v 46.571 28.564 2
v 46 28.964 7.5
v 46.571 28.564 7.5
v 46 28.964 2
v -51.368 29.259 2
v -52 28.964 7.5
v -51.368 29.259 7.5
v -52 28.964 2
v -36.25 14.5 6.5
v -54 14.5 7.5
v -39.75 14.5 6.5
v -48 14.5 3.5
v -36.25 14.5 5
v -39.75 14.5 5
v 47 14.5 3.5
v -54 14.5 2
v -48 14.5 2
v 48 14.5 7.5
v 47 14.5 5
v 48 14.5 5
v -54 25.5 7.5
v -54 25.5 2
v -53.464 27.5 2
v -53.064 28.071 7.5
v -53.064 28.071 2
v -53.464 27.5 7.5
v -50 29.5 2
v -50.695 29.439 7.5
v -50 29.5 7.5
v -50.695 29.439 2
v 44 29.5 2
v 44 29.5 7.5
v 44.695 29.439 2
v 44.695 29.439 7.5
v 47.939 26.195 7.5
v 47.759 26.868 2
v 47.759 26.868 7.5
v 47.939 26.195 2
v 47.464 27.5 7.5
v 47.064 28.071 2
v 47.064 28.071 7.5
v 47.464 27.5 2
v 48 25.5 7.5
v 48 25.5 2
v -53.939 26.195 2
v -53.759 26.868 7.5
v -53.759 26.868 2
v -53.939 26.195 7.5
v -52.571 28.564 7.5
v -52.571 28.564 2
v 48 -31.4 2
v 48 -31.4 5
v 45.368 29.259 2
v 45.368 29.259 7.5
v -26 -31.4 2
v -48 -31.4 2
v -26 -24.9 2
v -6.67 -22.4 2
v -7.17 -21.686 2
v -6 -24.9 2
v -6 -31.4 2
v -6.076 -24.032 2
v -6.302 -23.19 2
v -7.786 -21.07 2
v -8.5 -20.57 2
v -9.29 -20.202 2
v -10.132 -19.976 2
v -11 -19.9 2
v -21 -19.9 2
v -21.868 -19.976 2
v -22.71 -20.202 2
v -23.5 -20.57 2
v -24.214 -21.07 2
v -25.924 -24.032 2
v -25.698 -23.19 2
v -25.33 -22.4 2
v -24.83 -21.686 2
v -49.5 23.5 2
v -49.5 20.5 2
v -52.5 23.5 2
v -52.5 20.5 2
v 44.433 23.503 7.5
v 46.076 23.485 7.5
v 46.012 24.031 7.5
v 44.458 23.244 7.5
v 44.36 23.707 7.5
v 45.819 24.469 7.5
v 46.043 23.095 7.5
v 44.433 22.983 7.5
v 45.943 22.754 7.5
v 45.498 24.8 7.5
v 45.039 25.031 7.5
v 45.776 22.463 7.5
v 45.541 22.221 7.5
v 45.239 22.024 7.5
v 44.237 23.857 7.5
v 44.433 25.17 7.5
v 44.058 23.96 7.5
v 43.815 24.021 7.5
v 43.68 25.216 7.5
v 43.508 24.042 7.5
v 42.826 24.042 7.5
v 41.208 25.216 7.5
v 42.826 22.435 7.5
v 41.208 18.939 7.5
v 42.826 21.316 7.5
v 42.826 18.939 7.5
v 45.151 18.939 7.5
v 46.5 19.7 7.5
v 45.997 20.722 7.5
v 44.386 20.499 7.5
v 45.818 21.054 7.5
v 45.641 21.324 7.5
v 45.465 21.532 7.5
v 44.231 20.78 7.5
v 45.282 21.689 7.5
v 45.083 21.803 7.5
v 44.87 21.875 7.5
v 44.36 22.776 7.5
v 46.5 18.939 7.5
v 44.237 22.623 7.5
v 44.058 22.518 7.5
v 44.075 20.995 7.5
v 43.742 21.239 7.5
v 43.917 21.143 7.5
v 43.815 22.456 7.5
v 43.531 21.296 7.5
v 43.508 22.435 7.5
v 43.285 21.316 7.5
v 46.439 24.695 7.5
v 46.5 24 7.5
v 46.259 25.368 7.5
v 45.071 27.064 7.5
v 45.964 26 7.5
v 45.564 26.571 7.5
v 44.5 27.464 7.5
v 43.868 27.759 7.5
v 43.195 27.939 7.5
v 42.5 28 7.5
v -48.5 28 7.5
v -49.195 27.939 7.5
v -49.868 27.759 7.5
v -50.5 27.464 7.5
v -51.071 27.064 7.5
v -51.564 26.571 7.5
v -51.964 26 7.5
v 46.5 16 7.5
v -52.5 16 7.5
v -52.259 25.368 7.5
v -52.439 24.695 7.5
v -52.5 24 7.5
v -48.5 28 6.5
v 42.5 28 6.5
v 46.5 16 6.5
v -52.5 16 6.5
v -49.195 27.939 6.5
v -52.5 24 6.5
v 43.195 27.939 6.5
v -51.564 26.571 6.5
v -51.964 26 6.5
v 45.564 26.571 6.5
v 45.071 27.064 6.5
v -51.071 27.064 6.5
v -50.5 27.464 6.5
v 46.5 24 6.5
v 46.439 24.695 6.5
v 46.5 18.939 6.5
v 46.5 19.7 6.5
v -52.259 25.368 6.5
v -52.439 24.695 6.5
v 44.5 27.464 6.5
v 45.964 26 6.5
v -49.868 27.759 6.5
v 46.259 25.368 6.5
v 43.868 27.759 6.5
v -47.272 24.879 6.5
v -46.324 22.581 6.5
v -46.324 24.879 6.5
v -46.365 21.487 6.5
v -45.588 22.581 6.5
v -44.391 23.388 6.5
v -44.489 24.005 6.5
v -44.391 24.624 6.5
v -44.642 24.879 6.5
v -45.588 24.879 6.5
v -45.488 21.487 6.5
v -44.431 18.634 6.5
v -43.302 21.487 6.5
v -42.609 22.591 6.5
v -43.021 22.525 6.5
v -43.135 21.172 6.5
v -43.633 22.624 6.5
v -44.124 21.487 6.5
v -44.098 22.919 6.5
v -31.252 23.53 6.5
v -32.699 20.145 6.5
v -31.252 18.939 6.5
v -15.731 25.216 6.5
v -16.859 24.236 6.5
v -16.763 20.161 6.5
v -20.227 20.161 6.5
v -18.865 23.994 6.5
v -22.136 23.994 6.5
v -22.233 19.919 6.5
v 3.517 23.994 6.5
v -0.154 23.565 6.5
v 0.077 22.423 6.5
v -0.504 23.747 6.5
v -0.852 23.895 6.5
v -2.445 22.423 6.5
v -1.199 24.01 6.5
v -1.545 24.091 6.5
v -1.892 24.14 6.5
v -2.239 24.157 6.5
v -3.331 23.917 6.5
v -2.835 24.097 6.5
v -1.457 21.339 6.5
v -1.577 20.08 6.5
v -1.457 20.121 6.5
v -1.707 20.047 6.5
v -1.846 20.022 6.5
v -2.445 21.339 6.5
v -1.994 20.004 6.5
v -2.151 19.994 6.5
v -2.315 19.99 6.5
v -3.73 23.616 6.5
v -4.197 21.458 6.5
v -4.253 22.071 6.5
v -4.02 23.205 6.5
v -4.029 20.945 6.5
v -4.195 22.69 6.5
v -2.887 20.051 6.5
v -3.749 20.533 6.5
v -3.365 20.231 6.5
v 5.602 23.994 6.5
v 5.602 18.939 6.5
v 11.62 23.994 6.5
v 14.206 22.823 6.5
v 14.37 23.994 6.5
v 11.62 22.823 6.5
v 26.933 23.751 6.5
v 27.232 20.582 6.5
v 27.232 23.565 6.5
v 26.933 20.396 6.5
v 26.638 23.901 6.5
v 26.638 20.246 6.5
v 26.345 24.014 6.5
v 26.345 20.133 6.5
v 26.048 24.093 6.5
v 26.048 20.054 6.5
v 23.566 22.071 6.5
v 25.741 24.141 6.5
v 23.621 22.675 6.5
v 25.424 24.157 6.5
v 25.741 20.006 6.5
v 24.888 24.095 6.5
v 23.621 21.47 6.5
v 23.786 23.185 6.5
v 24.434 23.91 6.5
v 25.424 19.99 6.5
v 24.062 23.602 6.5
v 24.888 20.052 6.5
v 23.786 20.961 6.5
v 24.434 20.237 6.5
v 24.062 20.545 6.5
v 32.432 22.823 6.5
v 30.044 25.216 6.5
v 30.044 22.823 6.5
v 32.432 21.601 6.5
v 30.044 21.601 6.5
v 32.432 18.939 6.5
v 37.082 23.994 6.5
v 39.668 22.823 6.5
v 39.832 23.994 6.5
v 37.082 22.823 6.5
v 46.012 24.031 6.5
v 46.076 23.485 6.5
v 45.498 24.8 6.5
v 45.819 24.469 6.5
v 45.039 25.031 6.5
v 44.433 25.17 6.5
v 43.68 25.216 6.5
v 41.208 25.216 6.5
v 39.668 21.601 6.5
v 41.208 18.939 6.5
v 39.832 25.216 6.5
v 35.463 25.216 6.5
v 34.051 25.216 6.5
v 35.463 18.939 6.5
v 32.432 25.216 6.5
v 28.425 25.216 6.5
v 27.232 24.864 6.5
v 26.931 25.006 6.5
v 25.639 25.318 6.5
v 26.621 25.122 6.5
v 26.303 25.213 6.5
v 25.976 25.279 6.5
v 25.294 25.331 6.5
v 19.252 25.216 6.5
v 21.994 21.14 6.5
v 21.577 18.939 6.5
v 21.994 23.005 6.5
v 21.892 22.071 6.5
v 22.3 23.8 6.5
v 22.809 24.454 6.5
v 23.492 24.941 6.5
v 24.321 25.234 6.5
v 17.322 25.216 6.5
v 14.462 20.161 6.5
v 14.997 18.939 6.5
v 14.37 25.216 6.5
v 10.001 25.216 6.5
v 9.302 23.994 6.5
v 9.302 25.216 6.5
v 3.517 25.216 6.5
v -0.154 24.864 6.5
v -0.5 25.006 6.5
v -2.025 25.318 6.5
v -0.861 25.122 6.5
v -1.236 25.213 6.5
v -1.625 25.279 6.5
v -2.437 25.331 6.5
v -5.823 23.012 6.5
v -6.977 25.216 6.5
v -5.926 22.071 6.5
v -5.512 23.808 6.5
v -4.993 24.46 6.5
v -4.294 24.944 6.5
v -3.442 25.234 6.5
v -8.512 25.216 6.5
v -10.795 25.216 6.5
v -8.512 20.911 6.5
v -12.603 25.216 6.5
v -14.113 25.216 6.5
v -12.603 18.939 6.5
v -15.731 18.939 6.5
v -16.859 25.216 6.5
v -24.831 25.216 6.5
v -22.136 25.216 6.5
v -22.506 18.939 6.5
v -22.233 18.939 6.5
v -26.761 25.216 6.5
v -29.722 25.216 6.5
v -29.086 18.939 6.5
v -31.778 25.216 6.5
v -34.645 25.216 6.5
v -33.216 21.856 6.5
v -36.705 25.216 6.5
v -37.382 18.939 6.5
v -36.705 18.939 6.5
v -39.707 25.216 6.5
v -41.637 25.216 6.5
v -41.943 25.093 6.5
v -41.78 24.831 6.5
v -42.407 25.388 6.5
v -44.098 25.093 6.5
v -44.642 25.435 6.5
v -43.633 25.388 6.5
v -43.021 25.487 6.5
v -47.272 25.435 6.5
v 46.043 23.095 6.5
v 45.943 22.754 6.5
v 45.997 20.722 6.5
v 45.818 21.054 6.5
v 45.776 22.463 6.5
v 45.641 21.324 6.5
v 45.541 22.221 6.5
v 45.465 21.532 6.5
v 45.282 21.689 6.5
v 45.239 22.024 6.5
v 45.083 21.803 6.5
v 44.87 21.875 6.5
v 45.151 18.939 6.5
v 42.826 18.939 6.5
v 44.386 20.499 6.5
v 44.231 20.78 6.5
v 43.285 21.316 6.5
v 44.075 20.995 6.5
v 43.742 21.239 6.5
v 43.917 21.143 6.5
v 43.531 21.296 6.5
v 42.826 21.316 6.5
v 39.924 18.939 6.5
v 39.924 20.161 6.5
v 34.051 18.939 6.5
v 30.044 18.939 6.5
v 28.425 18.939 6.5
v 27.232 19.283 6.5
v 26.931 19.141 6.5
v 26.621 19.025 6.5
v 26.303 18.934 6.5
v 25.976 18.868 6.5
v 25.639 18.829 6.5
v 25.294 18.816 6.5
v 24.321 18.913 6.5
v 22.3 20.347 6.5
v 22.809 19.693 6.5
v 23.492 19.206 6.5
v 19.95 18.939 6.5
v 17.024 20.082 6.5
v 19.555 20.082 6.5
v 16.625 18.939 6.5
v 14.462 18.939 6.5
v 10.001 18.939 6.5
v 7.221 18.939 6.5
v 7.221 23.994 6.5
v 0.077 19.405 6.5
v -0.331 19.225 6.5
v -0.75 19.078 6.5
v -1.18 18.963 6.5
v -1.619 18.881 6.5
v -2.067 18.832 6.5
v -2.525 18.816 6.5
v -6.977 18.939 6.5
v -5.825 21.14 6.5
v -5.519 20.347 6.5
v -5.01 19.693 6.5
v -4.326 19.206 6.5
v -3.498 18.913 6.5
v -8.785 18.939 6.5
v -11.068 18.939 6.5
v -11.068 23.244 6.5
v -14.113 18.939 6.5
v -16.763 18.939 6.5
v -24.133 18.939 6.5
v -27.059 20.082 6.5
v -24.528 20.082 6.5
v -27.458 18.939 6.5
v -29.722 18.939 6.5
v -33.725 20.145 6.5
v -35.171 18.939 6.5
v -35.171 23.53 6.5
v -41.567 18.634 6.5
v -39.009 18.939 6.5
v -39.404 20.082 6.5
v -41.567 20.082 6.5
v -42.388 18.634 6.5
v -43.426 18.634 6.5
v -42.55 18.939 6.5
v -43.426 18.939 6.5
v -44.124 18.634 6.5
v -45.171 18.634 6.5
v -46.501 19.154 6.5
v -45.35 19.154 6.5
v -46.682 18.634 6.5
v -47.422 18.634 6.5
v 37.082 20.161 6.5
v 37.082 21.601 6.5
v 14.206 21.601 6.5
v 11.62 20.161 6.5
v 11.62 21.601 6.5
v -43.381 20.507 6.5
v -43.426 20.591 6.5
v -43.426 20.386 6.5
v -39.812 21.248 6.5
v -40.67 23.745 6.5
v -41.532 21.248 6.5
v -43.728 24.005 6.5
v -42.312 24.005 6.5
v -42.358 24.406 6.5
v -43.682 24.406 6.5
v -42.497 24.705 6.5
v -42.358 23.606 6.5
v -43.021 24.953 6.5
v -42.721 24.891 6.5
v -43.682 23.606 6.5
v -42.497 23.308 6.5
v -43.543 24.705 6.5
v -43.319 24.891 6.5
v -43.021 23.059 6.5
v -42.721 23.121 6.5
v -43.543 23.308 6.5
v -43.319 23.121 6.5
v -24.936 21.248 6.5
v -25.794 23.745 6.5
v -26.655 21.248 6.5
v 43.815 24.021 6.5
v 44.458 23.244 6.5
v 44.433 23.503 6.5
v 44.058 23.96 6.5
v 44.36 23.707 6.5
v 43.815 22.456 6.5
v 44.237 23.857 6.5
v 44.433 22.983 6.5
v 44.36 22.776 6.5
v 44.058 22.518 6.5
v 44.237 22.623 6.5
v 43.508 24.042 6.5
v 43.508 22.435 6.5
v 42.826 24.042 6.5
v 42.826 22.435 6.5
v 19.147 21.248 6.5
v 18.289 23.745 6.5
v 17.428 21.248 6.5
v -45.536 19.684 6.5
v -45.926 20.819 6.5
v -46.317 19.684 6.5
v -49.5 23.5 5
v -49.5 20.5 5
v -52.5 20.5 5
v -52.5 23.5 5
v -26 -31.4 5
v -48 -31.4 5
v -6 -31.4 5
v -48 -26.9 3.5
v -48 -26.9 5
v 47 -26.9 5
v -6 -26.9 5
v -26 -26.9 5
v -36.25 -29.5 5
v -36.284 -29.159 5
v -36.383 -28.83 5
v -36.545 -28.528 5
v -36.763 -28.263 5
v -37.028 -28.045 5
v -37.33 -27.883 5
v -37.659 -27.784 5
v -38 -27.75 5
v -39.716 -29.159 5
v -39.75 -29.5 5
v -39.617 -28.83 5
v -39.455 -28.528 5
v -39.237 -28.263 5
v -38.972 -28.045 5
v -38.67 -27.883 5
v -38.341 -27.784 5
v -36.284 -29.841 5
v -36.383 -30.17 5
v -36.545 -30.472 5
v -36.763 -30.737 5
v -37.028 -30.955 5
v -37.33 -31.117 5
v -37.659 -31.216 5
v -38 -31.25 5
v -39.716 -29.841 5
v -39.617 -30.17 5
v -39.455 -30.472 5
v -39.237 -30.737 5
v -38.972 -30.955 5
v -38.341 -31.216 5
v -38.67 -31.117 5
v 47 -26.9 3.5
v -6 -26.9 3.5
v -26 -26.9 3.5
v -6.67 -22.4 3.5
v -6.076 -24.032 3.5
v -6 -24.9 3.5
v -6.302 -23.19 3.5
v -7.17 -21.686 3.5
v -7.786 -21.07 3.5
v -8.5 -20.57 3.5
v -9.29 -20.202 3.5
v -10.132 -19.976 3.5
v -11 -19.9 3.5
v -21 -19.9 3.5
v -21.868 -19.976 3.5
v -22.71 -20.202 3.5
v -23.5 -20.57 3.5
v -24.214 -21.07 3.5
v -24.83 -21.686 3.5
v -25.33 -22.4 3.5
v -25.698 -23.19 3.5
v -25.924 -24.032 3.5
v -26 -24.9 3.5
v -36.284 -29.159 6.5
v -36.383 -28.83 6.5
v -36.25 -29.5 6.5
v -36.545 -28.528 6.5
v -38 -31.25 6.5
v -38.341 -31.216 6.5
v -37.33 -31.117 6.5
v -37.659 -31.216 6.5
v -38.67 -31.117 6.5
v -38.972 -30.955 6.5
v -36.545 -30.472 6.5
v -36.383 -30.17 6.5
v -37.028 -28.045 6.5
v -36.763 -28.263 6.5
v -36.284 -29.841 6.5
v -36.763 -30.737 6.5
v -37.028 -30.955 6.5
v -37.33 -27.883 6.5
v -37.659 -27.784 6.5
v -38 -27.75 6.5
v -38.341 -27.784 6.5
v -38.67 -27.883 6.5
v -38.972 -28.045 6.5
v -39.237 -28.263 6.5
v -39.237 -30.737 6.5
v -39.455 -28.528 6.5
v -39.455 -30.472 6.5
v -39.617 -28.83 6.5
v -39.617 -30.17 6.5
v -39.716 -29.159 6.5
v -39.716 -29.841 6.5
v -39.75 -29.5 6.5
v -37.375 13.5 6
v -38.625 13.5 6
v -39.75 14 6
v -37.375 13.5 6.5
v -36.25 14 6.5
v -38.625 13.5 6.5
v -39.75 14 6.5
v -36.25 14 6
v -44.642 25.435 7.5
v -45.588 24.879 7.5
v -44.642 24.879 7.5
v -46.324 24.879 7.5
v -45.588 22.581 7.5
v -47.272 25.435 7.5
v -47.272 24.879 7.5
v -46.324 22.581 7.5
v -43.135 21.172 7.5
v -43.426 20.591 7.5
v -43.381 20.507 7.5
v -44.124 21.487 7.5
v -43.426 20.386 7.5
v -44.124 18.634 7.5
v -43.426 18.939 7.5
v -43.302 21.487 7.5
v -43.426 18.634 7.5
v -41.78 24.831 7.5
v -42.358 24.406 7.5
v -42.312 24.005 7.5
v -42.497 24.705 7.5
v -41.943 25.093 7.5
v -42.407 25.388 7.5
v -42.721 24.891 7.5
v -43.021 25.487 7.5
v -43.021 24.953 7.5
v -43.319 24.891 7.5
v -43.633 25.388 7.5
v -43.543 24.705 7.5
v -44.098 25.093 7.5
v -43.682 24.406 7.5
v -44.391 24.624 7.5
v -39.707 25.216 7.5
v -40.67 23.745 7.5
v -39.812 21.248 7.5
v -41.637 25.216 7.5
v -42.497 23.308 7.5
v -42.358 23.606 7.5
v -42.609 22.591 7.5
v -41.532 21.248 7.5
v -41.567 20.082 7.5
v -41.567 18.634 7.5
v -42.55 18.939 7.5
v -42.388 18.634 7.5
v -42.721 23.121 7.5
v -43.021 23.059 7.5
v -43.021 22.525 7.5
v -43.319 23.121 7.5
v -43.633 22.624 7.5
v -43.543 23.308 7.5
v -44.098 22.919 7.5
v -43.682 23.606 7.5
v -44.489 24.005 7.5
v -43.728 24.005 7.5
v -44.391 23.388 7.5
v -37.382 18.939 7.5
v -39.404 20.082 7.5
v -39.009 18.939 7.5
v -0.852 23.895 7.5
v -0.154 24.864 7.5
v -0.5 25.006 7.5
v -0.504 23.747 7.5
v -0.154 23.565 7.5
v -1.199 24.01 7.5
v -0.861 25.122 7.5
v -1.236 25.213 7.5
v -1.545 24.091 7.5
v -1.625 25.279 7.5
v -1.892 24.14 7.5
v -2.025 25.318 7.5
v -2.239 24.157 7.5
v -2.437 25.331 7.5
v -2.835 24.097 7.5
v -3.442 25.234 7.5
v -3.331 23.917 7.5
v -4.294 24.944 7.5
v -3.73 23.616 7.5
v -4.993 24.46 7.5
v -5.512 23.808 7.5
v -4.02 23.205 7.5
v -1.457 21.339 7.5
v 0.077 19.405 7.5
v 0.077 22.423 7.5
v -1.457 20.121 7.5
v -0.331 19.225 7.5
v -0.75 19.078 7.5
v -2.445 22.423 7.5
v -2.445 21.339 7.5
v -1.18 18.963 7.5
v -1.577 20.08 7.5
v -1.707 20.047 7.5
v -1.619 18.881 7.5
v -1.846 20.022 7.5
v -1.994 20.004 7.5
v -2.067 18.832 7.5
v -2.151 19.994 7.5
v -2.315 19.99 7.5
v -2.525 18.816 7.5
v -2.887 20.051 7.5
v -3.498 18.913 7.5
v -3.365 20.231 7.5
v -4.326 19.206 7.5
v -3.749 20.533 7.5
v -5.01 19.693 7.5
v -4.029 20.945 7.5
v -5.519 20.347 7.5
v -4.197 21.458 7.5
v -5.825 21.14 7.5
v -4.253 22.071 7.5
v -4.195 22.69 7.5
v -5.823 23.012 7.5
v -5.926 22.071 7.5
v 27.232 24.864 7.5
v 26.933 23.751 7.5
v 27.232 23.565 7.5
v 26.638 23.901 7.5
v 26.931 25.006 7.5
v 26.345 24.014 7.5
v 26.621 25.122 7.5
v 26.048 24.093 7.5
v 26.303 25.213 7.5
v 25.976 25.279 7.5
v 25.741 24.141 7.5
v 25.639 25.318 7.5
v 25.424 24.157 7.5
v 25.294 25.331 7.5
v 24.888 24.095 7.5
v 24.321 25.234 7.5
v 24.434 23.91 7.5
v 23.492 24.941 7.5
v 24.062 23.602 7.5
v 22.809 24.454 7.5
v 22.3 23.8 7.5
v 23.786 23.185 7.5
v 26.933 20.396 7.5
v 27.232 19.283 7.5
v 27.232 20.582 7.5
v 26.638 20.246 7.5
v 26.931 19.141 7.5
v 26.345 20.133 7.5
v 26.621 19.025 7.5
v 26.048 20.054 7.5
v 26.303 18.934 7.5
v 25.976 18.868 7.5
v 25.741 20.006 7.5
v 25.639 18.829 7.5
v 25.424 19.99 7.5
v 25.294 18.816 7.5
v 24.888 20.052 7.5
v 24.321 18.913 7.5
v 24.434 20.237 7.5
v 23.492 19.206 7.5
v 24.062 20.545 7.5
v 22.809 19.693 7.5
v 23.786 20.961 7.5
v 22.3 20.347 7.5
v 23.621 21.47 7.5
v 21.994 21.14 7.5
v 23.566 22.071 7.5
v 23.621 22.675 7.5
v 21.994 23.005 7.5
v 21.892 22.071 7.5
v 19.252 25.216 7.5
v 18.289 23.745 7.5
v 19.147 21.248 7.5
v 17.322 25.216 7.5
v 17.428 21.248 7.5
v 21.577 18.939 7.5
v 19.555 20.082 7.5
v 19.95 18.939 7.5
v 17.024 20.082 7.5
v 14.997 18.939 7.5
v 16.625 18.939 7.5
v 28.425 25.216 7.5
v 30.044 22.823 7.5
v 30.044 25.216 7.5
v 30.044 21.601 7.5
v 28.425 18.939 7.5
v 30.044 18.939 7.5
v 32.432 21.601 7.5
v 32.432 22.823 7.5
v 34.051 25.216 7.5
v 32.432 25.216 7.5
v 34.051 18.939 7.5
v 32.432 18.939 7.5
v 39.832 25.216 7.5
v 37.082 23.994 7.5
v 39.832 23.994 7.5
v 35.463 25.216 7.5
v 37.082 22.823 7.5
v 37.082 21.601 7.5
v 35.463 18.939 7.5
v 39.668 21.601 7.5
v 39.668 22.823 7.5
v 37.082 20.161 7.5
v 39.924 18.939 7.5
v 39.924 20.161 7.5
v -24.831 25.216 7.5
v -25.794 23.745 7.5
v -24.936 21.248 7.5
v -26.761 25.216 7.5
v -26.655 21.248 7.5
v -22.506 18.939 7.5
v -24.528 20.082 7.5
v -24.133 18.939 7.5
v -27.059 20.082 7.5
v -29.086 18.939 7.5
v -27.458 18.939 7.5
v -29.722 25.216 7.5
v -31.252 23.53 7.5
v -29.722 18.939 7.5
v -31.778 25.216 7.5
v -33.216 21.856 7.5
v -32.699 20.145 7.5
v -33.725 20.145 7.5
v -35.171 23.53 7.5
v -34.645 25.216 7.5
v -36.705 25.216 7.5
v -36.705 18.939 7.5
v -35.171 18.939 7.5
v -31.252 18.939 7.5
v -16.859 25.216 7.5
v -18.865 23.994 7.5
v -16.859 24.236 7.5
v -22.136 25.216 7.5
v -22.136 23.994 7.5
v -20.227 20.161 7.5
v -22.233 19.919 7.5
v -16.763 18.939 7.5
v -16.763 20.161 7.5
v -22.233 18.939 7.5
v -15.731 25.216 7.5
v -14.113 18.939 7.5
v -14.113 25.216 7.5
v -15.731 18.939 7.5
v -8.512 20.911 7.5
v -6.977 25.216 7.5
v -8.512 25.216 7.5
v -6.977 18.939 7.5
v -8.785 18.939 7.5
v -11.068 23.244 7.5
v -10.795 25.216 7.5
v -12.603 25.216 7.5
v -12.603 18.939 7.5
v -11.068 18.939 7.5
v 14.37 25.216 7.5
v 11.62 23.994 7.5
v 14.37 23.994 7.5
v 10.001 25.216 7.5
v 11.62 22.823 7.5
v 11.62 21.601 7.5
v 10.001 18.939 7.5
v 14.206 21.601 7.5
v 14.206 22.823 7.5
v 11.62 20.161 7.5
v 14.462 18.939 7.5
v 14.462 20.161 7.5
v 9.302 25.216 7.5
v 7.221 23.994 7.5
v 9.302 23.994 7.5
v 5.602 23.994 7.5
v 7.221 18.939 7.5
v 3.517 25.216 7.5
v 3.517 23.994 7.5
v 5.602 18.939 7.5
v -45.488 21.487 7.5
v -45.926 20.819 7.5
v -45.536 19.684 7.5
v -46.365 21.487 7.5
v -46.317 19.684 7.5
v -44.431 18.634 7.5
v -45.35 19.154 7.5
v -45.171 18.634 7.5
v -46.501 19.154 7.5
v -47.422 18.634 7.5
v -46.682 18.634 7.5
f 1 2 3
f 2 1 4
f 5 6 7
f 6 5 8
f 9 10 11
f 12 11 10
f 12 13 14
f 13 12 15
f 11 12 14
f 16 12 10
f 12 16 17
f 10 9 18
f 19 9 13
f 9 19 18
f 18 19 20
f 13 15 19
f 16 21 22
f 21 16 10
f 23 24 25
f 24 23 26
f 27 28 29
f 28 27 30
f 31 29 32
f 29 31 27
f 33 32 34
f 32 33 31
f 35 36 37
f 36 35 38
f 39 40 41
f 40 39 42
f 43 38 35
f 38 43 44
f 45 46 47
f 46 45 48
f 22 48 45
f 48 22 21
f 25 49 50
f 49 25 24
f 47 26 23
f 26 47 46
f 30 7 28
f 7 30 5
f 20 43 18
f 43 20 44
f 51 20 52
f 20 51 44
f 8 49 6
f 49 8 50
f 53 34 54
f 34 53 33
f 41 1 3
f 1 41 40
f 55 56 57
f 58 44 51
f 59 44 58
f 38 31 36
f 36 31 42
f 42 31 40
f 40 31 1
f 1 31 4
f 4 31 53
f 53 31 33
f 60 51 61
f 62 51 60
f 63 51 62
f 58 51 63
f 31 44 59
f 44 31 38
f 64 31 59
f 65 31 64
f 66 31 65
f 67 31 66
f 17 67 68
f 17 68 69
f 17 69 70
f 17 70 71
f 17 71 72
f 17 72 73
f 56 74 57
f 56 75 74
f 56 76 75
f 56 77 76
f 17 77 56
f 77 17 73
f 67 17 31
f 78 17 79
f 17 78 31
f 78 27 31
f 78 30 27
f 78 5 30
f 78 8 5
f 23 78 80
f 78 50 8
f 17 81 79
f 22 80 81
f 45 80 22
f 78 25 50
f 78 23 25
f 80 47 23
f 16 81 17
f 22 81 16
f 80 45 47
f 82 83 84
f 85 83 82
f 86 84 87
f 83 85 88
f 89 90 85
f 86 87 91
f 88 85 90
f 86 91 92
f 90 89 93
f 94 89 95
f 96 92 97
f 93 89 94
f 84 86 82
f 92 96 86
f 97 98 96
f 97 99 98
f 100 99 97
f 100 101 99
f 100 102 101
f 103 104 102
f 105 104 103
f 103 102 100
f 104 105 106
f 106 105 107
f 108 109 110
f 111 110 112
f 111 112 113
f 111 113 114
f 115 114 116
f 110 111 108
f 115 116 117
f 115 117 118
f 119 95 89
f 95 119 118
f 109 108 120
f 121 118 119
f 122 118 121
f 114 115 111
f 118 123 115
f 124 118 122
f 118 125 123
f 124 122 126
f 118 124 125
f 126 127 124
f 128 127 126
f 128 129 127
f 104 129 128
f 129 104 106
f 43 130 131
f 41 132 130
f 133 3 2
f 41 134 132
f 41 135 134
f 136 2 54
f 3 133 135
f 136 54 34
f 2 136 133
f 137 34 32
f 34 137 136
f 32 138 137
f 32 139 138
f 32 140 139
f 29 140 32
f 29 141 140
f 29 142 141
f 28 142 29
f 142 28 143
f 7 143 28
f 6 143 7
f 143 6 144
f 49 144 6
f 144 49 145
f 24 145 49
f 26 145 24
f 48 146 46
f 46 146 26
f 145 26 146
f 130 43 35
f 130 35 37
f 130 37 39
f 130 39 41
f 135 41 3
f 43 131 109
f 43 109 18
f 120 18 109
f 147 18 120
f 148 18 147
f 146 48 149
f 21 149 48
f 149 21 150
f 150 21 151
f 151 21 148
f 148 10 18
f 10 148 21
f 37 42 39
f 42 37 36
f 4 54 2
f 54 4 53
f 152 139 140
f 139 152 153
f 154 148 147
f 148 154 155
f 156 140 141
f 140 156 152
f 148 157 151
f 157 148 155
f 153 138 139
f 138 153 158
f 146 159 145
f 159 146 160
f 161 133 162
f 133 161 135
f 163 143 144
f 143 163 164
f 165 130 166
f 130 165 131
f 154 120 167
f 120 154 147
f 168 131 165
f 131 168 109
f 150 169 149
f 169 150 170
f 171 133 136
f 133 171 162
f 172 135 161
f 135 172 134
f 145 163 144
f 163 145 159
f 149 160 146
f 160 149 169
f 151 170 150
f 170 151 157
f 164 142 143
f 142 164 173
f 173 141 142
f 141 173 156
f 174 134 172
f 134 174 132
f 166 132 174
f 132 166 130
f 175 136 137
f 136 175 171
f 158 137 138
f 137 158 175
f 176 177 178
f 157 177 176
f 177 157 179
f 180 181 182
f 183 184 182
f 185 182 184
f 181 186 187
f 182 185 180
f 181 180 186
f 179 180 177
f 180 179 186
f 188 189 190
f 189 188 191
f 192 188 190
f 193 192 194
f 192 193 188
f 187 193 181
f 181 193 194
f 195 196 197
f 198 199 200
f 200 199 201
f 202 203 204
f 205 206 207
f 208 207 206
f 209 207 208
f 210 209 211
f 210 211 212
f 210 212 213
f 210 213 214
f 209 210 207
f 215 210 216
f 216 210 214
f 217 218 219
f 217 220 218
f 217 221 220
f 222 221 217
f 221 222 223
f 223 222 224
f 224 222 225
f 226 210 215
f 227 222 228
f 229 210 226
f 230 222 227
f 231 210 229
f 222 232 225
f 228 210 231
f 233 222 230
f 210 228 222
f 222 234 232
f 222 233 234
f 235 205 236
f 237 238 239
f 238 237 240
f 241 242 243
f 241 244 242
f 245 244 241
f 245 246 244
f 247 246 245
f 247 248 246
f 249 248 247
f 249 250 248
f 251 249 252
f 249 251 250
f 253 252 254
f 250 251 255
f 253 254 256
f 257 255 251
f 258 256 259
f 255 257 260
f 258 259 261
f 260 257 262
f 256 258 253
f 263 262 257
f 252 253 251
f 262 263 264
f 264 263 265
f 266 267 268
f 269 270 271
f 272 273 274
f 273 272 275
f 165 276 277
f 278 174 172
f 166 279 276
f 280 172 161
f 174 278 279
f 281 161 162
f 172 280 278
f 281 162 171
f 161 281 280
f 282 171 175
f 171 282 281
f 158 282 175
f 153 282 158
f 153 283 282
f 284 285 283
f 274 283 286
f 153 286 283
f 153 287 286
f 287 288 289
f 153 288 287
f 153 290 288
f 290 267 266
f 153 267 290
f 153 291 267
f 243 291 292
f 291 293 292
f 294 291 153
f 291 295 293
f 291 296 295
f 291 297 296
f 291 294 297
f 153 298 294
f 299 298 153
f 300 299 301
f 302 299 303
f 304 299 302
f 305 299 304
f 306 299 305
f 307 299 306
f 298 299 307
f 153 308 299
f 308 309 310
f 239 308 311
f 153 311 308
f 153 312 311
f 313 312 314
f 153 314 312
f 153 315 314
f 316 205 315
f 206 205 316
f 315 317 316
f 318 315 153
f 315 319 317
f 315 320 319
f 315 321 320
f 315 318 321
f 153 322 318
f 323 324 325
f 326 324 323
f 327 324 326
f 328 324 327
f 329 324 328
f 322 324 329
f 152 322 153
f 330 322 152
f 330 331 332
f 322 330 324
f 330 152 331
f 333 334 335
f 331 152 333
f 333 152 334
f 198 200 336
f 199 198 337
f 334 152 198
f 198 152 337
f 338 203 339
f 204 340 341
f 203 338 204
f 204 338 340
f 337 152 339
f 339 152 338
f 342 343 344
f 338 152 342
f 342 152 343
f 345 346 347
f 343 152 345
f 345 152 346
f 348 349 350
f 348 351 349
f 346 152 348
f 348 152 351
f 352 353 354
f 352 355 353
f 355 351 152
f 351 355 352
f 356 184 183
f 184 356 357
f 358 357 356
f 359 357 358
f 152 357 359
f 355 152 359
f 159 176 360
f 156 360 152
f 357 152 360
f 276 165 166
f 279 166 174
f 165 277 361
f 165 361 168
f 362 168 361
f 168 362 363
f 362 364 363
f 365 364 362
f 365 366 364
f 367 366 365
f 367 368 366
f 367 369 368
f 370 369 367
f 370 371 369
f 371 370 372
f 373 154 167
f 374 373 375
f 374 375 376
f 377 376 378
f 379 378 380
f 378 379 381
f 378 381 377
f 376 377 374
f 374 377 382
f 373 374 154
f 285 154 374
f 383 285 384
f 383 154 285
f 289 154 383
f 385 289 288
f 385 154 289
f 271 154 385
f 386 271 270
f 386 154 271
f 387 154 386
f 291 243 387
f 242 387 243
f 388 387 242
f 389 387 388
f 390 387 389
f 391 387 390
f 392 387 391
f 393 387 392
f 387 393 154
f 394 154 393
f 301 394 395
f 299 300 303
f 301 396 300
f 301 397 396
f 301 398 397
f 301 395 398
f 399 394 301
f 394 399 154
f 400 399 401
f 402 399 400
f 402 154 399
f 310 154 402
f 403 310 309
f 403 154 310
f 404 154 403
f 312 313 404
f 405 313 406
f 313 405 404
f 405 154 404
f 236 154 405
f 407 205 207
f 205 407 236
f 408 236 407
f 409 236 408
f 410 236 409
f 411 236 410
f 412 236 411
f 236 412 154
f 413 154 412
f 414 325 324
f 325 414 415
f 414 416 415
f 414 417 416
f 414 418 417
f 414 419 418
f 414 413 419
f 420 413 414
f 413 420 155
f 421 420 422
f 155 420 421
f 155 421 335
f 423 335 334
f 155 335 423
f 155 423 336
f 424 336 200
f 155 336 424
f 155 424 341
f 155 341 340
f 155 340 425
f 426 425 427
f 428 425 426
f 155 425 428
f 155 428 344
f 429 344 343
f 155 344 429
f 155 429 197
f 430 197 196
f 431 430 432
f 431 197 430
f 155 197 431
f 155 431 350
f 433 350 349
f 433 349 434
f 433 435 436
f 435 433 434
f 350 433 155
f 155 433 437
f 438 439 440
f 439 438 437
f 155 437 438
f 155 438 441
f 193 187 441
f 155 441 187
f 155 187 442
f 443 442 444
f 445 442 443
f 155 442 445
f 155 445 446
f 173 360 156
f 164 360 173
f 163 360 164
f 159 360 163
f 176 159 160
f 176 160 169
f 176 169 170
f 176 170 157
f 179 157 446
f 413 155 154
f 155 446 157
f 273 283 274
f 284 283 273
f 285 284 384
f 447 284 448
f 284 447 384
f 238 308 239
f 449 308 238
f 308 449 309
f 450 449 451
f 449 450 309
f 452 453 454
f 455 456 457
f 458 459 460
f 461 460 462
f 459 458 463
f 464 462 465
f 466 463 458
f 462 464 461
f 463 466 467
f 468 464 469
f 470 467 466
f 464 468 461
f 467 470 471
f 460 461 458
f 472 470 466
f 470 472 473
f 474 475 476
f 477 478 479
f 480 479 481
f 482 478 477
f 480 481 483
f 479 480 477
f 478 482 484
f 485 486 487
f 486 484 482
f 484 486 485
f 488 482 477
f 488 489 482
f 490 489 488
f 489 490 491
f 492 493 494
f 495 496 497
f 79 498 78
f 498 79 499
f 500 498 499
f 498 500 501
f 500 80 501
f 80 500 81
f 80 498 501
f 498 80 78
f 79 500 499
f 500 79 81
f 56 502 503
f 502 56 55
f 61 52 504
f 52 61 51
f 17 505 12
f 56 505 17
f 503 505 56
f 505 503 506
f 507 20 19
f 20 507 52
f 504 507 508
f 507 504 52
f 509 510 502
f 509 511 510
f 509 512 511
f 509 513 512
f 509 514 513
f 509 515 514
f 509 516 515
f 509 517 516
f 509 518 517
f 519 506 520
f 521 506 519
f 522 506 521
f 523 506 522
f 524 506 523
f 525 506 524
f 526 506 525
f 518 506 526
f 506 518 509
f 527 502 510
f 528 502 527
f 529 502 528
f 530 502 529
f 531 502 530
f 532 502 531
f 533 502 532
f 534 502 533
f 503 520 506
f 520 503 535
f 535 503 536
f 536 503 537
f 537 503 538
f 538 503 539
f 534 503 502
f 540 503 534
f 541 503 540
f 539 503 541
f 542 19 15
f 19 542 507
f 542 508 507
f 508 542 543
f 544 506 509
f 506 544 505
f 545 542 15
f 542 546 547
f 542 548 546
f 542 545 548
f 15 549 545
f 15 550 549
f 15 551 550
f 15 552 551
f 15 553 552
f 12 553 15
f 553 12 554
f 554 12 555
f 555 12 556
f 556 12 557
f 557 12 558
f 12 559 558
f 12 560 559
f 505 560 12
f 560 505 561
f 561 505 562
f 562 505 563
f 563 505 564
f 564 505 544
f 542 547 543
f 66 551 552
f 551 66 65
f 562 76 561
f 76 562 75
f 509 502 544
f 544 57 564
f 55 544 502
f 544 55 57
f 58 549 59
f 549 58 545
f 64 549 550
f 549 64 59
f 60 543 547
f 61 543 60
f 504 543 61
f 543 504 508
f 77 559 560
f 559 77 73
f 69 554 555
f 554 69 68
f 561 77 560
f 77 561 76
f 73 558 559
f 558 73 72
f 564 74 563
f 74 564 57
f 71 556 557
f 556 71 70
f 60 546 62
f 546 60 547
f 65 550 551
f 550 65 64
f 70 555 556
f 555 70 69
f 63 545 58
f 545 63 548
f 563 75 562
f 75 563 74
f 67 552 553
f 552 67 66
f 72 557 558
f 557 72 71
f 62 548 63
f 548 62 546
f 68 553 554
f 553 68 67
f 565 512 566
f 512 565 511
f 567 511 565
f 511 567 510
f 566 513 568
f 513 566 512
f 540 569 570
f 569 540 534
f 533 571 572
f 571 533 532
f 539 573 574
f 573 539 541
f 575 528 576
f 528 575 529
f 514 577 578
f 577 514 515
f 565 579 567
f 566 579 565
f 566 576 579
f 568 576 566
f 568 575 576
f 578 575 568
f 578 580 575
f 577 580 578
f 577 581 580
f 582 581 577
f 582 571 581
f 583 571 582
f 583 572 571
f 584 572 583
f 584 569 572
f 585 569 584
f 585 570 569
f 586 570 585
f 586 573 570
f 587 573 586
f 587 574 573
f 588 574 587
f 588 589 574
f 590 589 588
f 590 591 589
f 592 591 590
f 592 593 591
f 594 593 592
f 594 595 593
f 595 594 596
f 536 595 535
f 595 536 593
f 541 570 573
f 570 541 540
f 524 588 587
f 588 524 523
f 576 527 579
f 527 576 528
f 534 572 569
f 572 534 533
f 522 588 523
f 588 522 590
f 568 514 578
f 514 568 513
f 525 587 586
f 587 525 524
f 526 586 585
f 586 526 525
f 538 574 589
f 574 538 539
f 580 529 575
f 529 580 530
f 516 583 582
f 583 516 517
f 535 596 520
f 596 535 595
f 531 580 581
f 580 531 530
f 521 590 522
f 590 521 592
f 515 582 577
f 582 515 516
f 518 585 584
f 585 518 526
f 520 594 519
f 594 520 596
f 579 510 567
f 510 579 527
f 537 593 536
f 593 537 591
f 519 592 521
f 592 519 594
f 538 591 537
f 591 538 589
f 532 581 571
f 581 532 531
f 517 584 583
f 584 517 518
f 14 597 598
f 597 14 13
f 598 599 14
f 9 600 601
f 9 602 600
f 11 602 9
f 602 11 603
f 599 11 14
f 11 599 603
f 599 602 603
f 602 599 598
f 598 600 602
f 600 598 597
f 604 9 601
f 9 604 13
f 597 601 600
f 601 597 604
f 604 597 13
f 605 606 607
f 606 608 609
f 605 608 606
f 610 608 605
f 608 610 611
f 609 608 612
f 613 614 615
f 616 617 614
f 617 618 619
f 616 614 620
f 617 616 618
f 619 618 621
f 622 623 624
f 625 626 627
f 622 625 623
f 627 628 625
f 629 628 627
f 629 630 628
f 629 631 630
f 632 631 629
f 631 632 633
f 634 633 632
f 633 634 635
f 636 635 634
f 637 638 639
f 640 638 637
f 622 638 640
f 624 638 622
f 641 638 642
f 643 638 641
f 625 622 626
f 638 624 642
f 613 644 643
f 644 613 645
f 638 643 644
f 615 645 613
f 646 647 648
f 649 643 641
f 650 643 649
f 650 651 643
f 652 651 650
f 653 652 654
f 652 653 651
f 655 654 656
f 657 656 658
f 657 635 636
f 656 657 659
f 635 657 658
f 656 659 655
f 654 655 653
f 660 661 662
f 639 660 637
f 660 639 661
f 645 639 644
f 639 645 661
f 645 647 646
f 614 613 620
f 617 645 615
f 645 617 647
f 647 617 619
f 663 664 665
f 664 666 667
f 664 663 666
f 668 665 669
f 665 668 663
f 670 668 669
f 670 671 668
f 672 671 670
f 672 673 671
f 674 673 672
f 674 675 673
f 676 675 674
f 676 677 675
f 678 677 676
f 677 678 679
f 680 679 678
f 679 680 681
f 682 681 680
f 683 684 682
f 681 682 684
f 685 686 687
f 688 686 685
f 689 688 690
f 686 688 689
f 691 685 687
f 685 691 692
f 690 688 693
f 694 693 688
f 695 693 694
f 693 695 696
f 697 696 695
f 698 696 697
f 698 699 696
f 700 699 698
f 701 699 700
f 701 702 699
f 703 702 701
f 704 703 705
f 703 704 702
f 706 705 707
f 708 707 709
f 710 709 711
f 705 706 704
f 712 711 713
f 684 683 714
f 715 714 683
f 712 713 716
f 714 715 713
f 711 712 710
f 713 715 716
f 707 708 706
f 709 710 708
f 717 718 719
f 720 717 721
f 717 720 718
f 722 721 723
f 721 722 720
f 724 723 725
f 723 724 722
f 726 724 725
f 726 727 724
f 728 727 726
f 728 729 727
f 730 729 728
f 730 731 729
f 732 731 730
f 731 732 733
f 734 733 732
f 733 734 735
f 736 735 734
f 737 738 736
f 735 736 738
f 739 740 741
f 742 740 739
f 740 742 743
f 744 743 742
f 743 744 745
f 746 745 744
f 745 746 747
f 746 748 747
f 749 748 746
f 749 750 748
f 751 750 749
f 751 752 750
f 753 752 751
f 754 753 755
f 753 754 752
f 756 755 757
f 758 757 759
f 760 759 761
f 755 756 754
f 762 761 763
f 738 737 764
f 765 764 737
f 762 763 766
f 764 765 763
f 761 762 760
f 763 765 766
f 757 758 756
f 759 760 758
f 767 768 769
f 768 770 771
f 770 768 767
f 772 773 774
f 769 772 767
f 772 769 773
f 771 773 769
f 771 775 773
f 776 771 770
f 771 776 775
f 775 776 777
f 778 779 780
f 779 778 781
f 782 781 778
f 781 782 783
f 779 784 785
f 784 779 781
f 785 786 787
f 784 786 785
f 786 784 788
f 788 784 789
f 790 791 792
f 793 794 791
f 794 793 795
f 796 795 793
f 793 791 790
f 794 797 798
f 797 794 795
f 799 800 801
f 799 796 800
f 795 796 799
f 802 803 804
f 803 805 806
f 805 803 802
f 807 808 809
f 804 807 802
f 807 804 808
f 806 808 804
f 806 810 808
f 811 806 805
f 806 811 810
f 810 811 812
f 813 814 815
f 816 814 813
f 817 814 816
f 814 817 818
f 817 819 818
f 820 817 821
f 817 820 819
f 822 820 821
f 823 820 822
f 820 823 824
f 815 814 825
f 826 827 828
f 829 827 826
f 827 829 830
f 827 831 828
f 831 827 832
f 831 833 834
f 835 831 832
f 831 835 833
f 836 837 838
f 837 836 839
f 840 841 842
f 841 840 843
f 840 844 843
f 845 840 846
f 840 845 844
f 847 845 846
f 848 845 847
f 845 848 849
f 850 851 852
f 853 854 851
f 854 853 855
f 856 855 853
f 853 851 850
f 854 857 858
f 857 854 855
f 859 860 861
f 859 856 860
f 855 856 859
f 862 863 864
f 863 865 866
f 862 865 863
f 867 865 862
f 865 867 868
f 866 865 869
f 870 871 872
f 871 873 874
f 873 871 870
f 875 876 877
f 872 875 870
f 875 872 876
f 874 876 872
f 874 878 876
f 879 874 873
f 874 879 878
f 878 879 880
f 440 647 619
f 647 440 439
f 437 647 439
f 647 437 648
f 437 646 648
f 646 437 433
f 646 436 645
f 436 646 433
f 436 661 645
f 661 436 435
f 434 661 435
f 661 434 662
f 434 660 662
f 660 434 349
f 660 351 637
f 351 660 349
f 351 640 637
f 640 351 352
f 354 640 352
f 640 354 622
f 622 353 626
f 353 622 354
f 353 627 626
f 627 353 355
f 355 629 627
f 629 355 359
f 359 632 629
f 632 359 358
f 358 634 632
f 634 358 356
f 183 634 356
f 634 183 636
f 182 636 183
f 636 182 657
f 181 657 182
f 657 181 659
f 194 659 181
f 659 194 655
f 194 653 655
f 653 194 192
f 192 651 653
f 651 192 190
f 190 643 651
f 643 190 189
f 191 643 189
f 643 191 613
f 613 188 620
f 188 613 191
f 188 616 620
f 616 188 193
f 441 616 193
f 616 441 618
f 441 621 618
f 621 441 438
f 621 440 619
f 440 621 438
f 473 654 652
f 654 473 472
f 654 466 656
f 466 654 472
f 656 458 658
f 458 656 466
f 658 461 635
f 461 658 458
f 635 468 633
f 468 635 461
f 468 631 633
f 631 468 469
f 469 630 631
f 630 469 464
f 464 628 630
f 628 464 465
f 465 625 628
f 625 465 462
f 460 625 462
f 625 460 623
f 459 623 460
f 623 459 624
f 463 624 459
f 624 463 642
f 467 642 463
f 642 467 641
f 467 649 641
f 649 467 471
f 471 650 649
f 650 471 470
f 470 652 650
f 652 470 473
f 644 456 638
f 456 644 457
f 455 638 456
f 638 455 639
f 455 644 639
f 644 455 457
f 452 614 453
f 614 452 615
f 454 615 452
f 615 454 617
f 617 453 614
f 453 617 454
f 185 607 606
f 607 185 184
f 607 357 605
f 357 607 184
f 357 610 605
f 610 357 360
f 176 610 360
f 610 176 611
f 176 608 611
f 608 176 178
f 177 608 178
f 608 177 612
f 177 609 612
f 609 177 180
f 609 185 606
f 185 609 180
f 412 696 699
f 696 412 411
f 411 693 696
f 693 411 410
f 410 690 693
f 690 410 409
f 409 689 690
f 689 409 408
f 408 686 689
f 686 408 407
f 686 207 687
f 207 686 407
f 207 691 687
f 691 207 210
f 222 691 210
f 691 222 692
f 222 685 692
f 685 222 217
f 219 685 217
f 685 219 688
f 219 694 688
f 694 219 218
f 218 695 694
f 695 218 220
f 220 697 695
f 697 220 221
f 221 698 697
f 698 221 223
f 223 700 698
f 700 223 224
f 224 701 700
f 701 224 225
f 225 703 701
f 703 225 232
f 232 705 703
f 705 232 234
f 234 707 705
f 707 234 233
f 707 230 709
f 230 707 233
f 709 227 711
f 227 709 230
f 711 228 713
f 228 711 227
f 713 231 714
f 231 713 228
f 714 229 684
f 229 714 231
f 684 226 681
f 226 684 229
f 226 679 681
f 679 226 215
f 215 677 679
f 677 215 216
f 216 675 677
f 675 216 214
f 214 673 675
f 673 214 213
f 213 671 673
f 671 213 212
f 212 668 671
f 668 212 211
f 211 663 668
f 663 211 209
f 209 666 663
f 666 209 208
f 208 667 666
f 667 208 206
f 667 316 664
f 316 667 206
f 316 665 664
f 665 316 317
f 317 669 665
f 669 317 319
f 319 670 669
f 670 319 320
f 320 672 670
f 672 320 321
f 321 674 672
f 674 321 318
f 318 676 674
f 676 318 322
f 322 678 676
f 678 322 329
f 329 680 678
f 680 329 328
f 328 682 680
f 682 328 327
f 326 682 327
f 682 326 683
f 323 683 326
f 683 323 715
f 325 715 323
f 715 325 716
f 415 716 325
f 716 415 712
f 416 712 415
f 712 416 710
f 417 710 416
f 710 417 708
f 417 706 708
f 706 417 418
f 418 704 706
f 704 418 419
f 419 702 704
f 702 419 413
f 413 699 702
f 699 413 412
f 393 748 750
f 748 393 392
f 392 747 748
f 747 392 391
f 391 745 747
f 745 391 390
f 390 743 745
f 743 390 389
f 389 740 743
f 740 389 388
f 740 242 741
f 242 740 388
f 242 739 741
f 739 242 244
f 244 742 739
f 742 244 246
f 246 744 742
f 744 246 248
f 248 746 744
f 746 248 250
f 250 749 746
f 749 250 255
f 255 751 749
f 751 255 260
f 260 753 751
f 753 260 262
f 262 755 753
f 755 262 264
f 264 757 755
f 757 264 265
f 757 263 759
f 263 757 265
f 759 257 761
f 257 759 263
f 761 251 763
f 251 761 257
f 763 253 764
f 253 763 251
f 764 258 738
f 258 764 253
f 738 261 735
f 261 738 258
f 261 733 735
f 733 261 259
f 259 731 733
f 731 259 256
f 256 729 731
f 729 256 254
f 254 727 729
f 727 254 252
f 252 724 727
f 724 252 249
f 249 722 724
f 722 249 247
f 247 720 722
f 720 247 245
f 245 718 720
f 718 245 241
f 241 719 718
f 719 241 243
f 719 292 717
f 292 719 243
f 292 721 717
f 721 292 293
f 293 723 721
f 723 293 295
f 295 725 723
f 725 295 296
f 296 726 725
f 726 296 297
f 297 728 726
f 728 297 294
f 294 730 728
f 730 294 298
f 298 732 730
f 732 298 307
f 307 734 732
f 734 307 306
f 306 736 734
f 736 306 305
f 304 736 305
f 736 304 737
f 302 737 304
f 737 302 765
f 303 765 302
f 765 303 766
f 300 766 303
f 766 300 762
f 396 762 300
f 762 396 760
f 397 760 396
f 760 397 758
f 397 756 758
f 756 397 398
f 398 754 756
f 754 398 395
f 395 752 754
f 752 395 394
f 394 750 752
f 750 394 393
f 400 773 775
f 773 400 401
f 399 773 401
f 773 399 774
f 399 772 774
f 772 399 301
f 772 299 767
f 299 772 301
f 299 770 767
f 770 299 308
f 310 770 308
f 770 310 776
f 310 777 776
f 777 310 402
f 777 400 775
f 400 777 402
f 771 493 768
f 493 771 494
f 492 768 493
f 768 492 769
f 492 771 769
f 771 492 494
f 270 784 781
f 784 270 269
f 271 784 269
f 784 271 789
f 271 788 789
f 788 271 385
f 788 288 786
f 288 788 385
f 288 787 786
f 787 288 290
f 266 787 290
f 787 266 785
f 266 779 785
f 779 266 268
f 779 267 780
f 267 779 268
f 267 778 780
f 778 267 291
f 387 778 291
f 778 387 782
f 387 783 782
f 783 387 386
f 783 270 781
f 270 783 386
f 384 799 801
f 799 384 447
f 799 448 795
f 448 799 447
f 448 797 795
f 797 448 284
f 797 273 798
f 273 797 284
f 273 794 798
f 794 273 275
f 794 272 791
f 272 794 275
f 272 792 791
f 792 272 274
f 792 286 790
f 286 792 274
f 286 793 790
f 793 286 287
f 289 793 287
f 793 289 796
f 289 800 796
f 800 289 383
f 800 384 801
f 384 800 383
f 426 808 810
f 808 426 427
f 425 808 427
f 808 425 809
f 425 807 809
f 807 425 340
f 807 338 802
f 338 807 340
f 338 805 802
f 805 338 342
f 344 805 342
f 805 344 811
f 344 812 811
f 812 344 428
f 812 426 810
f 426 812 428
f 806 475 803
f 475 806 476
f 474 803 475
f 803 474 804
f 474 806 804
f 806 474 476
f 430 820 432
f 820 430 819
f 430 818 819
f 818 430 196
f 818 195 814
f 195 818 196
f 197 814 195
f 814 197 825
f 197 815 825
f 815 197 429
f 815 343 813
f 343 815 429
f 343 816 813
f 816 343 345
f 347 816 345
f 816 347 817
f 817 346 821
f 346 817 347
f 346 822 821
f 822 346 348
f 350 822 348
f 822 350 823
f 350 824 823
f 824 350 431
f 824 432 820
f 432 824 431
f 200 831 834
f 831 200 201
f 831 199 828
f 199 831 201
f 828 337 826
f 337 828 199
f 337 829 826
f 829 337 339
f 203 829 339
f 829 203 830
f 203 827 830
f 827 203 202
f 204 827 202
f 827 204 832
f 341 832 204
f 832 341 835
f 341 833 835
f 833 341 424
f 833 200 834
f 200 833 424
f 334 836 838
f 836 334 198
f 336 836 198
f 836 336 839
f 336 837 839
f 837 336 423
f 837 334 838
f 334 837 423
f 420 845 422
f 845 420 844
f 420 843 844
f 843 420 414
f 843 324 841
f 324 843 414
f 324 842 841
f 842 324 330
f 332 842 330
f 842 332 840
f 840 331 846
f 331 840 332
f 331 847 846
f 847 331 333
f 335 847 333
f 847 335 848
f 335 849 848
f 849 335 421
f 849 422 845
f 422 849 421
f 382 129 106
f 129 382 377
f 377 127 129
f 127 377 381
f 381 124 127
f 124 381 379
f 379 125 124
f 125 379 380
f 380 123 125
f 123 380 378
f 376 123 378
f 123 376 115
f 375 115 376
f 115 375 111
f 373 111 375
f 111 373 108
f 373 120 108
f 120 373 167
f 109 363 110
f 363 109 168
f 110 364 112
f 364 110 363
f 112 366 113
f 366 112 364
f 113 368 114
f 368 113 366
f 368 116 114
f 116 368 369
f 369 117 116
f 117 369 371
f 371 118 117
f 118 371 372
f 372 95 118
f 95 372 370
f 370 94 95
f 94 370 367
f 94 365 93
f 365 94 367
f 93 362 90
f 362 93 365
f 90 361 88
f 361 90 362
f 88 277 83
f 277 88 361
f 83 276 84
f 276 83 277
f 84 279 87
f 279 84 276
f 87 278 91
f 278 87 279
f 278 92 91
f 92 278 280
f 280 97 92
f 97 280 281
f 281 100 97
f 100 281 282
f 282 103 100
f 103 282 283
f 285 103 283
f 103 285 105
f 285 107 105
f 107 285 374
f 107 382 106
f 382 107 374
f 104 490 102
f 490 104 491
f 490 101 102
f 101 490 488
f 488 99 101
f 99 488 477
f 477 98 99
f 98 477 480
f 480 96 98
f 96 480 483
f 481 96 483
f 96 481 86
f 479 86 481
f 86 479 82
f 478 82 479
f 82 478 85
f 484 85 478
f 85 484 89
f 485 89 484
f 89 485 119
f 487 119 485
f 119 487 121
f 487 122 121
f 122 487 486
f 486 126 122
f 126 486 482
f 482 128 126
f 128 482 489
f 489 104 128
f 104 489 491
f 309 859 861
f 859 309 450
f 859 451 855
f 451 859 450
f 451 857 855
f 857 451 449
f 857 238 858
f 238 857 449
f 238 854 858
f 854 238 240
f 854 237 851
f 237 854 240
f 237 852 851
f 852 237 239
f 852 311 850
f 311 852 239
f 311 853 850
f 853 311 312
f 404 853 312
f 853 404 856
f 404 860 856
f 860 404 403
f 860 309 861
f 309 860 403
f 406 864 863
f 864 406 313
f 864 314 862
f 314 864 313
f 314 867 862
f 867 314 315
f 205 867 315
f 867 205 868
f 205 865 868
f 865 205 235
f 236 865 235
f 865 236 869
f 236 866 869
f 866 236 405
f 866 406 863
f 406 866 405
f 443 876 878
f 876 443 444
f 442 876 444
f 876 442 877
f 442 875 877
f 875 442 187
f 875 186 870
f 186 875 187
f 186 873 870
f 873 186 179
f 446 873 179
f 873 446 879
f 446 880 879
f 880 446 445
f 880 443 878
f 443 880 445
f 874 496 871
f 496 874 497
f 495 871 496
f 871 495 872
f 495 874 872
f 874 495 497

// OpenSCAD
textLeft1="TO";
textLeft2="AN";
textMain="AMAZING TEACHER";

/* [hidden] */



font_width_arial_black = [
["A",0.778],["B",0.778],["C",0.778],["D",0.778],["E",0.722],
["F",0.667],["G",0.833],["H",0.833],["I",0.389],["J",0.667],
["K",0.833],["L",0.667],["M",0.944],["N",0.833],["O",0.833],
["P",0.722],["Q",0.833],["R",0.778],["S",0.722],["T",0.722],
["U",0.833],["V",0.778],["W",1],["X",0.778],["Y",0.778],
["Z",0.722],["a",0.667],["b",0.667],["c",0.667],["d",0.667],
["e",0.667],["f",0.389],["g",0.667],["h",0.667],["i",0.333],
["j",0.333],["k",0.667],["l",0.333],["m",1],["n",0.667],
["o",0.667],["p",0.667],["q",0.667],["r",0.444],["s",0.611],
["t",0.444],["u",0.667],["v",0.611],["w",0.944],["x",0.667],
["y",0.611],["z",0.556],["1",0.667],["2",0.667],["3",0.667],
["4",0.667],["5",0.667],["6",0.667],["7",0.667],["8",0.667],
["9",0.667],["0",0.667],["!",0.333],["@",0.74],["#",0.66],
["$",0.667],["%",1],["^",0.66],["&",0.889],["*",0.556],
["(",0.389],[")",0.389],["_",0.5],[":",0.333],[",",0.333],
[".",0.333],["\"",0.5],["'",0.278],["-",0.333],[" ",0.334],["?",0.611],
["~",0]
];
font_width_scale_arial_black = 1;
//font_width_scale_arial_black = 94.8/70.9466;

font_width_arial = [
["A",0.667],["B",0.667],["C",0.722],["D",0.722],["E",0.667],
["F",0.611],["G",0.778],["H",0.722],["I",0.278],["J",0.5],
["K",0.667],["L",0.556],["M",0.833],["N",0.722],["O",0.778],
["P",0.667],["Q",0.778],["R",0.722],["S",0.667],["T",0.611],
["U",0.722],["V",0.667],["W",0.944],["X",0.667],["Y",0.667],
["Z",0.611],["a",0.556],["b",0.556],["c",0.5],["d",0.556],
["e",0.556],["f",0.278],["g",0.556],["h",0.556],["i",0.222],
["j",0.222],["k",0.5],["l",0.222],["m",0.833],["n",0.556],
["o",0.556],["p",0.556],["q",0.556],["r",0.333],["s",0.5],
["t",0.278],["u",0.556],["v",0.5],["w",0.722],["x",0.5],
["y",0.5],["z",0.5],["1",0.556],["2",0.556],["3",0.556],
["4",0.556],["5",0.556],["6",0.556],["7",0.556],["8",0.556],
["9",0.556],["0",0.556],["!",0.278],["@",1.015],["#",0.556],
["$",0.556],["%",0.889],["^",0.469],["&",0.667],["*",0.389],
["(",0.333],[")",0.333],["_",0.556],[":",0.278],[",",0.278],
[".",0.278],["?",0.556],["-",0.333],[" ",0.278],["~",0]
];
font_width_scale_arial = 83.5/63.3826;

font_width_arial_bold = [
["A",0.722],["B",0.667],["C",0.667],["D",0.722],["E",0.611],
["F",0.556],["G",0.722],["H",0.722],["I",0.333],["J",0.389],
["K",0.722],["L",0.611],["M",0.889],["N",0.722],["O",0.722],
["P",0.556],["Q",0.722],["R",0.667],["S",0.556],["T",0.611],
["U",0.722],["V",0.722],["W",0.944],["X",0.722],["Y",0.722],
["Z",0.611],["a",0.444],["b",0.5],["c",0.444],["d",0.5],
["e",0.444],["f",0.333],["g",0.5],["h",0.5],["i",0.278],
["j",0.278],["k",0.5],["l",0.278],["m",0.778],["n",0.5],
["o",0.5],["p",0.5],["q",0.5],["r",0.333],["s",0.389],
["t",0.278],["u",0.5],["v",0.5],["w",0.722],["x",0.5],
["y",0.5],["z",0.444],["1",0.5],["2",0.5],["3",0.5],
["4",0.5],["5",0.5],["6",0.5],["7",0.5],["8",0.5],
["9",0.5],["0",0.5],["!",0.333],["@",0.921],["#",0.5],
["$",0.5],["%",0.833],["^",0.469],["&",0.778],["*",0.5],
["(",0.333],[")",0.333],["_",0.5],[":",0.278],[",",0.25],
[".",0.25],["?",0.444],["-",0.333],[" ",0.25],["~",0],
];
font_width_scale_arial_bold = 85.0/63.023;


font="Arial Sans:style=Bold";
t = font_width_arial_bold;
s = font_width_scale_arial_bold;

// add text:
/*
font="Arial Black";
t = font_width_arial_black;
s = font_width_scale_arial_black;
*/
/*
font="Arial";
t = font_width_arial;
s = font_width_scale_arial;
*/
/*
font="Arial Sans:style=Bold";
t = font_width_arial_bold;
s = font_width_scale_arial_bold;
*/


function getCharWidth(ch="X") =
    t[search(ch, t, num_returns_per_match=0)[0][0]][1];

function _getStringWidth(str,i=0) =
    len(str) > i ? getCharWidth(str[i]) + _getStringWidth(str,i+1) : 0;

function getStringWidth(str,size) = 
    (_getStringWidth(str,0)+(len(str)-1)*getCharWidth("~")) * s * size;

/*
module getCharWidthMod(ch="X") = 
    
    echo("char - ", ch);
    idx = search(ch, t, num_returns_per_match=0);
    if (len(idx[0])) {
        echo(ch, idx, idx[0][0], t[idx[0][0]][1]);
        
    } else {
        echo ("not found");
    };
}
*/

mainFontSize=6.2;
smallFontSize=mainFontSize/2.2;

    
textLeftSize = max( getStringWidth(textLeft1,smallFontSize), 
                    getStringWidth(textLeft2,smallFontSize));
textMainSize = getStringWidth(textMain,mainFontSize);

gapSize = textLeftSize > 0 ? textMainSize > 0 ? 3 : 0 : 0;

textMainOffset=(textLeftSize+gapSize)/2;
textLeftOffset=textMainOffset-textMainSize/2-gapSize-textLeftSize/2;

echo(textMainOffset);
echo(textLeftOffset);

textHotPoint=[-2.8,22,6.5];

/*
translate(textHotPoint)  translate([textMainOffset,0,0]){
    
    color("blue") sphere(2);
    color("blue") translate([textMainSize/2,0,0]) sphere(1);
    color("blue") translate([-textMainSize/2,0,0]) sphere(1);
    color("blue") translate([-textMainSize/2-gapSize,0,0]) sphere(1);
    color("blue") translate([-textMainSize/2-gapSize-textLeftSize,0,0]) sphere(1);
}
*/

translate(textHotPoint)
color("red")
linear_extrude(1) {
    
    translate([textMainOffset,0,0])
    text(textMain, size= mainFontSize, font=font, halign="center", valign="center");


    // draw small text:
    translate([textLeftOffset,smallFontSize*0.7,0]) 
        text(textLeft1, size = smallFontSize, font=font, halign="center", valign="center");
    translate([textLeftOffset,-smallFontSize*0.7,0]) 
        text(textLeft2, size = smallFontSize, font=font, halign="center", valign="center");
    
}
//object_stl(1);
// Here is right object !!!

translate([0,0,2]){
  translate([-3,22,0])
    difference(){
      rounded_brick([102,15,5.5],[4,0,4,0]);
      translate([0,0,4.5])rounded_brick([102-3,15-3,5.5],[4,0,4,0]);
      translate([-49.5,-1.5,-.1])cube([3,3,3.1]);
    }
    translate([0,-1.4,0])
      difference(){
        translate([0,-5,0])rounded_brick([96,50,3],[0,0,0,0]);
        translate([-1,0,1.5])rounded_brick([96,51,3],[0,0,0,0]);
        translate([-16,-26,-.1])rounded_brick([20,15,4],[5,0,5,0]);
      }
    translate([-38,-29.5,2.5])cylinder(h=2,d=3.5,$fn=32);
    translate([-38,15,3]){
      hull(){
        translate([0,0,.5])cube([3.5,1,1],center=true);
        translate([0,-.5,1+.25])cube([3.5,1,.5],center=true);
        translate([0,-1,1+.25])cube([1.25,1,.5],center=true);
        }
    }
}
module rounded_brick(d=[10,10,10],sides=[1,1,1,1]){
  hull()
    for (i=[0:3])
        mirror([floor(i/2),0,0])mirror([0,i%2,0])
          if (sides[i])
            translate([d[0]/2-sides[i],d[1]/2-sides[i],0])
              cylinder(h=d[2],r=sides[i],$fn=36);
          else
            translate([d[0]/2-1,d[1]/2-1,0])
              cube([1,1,d[2]]);
}
